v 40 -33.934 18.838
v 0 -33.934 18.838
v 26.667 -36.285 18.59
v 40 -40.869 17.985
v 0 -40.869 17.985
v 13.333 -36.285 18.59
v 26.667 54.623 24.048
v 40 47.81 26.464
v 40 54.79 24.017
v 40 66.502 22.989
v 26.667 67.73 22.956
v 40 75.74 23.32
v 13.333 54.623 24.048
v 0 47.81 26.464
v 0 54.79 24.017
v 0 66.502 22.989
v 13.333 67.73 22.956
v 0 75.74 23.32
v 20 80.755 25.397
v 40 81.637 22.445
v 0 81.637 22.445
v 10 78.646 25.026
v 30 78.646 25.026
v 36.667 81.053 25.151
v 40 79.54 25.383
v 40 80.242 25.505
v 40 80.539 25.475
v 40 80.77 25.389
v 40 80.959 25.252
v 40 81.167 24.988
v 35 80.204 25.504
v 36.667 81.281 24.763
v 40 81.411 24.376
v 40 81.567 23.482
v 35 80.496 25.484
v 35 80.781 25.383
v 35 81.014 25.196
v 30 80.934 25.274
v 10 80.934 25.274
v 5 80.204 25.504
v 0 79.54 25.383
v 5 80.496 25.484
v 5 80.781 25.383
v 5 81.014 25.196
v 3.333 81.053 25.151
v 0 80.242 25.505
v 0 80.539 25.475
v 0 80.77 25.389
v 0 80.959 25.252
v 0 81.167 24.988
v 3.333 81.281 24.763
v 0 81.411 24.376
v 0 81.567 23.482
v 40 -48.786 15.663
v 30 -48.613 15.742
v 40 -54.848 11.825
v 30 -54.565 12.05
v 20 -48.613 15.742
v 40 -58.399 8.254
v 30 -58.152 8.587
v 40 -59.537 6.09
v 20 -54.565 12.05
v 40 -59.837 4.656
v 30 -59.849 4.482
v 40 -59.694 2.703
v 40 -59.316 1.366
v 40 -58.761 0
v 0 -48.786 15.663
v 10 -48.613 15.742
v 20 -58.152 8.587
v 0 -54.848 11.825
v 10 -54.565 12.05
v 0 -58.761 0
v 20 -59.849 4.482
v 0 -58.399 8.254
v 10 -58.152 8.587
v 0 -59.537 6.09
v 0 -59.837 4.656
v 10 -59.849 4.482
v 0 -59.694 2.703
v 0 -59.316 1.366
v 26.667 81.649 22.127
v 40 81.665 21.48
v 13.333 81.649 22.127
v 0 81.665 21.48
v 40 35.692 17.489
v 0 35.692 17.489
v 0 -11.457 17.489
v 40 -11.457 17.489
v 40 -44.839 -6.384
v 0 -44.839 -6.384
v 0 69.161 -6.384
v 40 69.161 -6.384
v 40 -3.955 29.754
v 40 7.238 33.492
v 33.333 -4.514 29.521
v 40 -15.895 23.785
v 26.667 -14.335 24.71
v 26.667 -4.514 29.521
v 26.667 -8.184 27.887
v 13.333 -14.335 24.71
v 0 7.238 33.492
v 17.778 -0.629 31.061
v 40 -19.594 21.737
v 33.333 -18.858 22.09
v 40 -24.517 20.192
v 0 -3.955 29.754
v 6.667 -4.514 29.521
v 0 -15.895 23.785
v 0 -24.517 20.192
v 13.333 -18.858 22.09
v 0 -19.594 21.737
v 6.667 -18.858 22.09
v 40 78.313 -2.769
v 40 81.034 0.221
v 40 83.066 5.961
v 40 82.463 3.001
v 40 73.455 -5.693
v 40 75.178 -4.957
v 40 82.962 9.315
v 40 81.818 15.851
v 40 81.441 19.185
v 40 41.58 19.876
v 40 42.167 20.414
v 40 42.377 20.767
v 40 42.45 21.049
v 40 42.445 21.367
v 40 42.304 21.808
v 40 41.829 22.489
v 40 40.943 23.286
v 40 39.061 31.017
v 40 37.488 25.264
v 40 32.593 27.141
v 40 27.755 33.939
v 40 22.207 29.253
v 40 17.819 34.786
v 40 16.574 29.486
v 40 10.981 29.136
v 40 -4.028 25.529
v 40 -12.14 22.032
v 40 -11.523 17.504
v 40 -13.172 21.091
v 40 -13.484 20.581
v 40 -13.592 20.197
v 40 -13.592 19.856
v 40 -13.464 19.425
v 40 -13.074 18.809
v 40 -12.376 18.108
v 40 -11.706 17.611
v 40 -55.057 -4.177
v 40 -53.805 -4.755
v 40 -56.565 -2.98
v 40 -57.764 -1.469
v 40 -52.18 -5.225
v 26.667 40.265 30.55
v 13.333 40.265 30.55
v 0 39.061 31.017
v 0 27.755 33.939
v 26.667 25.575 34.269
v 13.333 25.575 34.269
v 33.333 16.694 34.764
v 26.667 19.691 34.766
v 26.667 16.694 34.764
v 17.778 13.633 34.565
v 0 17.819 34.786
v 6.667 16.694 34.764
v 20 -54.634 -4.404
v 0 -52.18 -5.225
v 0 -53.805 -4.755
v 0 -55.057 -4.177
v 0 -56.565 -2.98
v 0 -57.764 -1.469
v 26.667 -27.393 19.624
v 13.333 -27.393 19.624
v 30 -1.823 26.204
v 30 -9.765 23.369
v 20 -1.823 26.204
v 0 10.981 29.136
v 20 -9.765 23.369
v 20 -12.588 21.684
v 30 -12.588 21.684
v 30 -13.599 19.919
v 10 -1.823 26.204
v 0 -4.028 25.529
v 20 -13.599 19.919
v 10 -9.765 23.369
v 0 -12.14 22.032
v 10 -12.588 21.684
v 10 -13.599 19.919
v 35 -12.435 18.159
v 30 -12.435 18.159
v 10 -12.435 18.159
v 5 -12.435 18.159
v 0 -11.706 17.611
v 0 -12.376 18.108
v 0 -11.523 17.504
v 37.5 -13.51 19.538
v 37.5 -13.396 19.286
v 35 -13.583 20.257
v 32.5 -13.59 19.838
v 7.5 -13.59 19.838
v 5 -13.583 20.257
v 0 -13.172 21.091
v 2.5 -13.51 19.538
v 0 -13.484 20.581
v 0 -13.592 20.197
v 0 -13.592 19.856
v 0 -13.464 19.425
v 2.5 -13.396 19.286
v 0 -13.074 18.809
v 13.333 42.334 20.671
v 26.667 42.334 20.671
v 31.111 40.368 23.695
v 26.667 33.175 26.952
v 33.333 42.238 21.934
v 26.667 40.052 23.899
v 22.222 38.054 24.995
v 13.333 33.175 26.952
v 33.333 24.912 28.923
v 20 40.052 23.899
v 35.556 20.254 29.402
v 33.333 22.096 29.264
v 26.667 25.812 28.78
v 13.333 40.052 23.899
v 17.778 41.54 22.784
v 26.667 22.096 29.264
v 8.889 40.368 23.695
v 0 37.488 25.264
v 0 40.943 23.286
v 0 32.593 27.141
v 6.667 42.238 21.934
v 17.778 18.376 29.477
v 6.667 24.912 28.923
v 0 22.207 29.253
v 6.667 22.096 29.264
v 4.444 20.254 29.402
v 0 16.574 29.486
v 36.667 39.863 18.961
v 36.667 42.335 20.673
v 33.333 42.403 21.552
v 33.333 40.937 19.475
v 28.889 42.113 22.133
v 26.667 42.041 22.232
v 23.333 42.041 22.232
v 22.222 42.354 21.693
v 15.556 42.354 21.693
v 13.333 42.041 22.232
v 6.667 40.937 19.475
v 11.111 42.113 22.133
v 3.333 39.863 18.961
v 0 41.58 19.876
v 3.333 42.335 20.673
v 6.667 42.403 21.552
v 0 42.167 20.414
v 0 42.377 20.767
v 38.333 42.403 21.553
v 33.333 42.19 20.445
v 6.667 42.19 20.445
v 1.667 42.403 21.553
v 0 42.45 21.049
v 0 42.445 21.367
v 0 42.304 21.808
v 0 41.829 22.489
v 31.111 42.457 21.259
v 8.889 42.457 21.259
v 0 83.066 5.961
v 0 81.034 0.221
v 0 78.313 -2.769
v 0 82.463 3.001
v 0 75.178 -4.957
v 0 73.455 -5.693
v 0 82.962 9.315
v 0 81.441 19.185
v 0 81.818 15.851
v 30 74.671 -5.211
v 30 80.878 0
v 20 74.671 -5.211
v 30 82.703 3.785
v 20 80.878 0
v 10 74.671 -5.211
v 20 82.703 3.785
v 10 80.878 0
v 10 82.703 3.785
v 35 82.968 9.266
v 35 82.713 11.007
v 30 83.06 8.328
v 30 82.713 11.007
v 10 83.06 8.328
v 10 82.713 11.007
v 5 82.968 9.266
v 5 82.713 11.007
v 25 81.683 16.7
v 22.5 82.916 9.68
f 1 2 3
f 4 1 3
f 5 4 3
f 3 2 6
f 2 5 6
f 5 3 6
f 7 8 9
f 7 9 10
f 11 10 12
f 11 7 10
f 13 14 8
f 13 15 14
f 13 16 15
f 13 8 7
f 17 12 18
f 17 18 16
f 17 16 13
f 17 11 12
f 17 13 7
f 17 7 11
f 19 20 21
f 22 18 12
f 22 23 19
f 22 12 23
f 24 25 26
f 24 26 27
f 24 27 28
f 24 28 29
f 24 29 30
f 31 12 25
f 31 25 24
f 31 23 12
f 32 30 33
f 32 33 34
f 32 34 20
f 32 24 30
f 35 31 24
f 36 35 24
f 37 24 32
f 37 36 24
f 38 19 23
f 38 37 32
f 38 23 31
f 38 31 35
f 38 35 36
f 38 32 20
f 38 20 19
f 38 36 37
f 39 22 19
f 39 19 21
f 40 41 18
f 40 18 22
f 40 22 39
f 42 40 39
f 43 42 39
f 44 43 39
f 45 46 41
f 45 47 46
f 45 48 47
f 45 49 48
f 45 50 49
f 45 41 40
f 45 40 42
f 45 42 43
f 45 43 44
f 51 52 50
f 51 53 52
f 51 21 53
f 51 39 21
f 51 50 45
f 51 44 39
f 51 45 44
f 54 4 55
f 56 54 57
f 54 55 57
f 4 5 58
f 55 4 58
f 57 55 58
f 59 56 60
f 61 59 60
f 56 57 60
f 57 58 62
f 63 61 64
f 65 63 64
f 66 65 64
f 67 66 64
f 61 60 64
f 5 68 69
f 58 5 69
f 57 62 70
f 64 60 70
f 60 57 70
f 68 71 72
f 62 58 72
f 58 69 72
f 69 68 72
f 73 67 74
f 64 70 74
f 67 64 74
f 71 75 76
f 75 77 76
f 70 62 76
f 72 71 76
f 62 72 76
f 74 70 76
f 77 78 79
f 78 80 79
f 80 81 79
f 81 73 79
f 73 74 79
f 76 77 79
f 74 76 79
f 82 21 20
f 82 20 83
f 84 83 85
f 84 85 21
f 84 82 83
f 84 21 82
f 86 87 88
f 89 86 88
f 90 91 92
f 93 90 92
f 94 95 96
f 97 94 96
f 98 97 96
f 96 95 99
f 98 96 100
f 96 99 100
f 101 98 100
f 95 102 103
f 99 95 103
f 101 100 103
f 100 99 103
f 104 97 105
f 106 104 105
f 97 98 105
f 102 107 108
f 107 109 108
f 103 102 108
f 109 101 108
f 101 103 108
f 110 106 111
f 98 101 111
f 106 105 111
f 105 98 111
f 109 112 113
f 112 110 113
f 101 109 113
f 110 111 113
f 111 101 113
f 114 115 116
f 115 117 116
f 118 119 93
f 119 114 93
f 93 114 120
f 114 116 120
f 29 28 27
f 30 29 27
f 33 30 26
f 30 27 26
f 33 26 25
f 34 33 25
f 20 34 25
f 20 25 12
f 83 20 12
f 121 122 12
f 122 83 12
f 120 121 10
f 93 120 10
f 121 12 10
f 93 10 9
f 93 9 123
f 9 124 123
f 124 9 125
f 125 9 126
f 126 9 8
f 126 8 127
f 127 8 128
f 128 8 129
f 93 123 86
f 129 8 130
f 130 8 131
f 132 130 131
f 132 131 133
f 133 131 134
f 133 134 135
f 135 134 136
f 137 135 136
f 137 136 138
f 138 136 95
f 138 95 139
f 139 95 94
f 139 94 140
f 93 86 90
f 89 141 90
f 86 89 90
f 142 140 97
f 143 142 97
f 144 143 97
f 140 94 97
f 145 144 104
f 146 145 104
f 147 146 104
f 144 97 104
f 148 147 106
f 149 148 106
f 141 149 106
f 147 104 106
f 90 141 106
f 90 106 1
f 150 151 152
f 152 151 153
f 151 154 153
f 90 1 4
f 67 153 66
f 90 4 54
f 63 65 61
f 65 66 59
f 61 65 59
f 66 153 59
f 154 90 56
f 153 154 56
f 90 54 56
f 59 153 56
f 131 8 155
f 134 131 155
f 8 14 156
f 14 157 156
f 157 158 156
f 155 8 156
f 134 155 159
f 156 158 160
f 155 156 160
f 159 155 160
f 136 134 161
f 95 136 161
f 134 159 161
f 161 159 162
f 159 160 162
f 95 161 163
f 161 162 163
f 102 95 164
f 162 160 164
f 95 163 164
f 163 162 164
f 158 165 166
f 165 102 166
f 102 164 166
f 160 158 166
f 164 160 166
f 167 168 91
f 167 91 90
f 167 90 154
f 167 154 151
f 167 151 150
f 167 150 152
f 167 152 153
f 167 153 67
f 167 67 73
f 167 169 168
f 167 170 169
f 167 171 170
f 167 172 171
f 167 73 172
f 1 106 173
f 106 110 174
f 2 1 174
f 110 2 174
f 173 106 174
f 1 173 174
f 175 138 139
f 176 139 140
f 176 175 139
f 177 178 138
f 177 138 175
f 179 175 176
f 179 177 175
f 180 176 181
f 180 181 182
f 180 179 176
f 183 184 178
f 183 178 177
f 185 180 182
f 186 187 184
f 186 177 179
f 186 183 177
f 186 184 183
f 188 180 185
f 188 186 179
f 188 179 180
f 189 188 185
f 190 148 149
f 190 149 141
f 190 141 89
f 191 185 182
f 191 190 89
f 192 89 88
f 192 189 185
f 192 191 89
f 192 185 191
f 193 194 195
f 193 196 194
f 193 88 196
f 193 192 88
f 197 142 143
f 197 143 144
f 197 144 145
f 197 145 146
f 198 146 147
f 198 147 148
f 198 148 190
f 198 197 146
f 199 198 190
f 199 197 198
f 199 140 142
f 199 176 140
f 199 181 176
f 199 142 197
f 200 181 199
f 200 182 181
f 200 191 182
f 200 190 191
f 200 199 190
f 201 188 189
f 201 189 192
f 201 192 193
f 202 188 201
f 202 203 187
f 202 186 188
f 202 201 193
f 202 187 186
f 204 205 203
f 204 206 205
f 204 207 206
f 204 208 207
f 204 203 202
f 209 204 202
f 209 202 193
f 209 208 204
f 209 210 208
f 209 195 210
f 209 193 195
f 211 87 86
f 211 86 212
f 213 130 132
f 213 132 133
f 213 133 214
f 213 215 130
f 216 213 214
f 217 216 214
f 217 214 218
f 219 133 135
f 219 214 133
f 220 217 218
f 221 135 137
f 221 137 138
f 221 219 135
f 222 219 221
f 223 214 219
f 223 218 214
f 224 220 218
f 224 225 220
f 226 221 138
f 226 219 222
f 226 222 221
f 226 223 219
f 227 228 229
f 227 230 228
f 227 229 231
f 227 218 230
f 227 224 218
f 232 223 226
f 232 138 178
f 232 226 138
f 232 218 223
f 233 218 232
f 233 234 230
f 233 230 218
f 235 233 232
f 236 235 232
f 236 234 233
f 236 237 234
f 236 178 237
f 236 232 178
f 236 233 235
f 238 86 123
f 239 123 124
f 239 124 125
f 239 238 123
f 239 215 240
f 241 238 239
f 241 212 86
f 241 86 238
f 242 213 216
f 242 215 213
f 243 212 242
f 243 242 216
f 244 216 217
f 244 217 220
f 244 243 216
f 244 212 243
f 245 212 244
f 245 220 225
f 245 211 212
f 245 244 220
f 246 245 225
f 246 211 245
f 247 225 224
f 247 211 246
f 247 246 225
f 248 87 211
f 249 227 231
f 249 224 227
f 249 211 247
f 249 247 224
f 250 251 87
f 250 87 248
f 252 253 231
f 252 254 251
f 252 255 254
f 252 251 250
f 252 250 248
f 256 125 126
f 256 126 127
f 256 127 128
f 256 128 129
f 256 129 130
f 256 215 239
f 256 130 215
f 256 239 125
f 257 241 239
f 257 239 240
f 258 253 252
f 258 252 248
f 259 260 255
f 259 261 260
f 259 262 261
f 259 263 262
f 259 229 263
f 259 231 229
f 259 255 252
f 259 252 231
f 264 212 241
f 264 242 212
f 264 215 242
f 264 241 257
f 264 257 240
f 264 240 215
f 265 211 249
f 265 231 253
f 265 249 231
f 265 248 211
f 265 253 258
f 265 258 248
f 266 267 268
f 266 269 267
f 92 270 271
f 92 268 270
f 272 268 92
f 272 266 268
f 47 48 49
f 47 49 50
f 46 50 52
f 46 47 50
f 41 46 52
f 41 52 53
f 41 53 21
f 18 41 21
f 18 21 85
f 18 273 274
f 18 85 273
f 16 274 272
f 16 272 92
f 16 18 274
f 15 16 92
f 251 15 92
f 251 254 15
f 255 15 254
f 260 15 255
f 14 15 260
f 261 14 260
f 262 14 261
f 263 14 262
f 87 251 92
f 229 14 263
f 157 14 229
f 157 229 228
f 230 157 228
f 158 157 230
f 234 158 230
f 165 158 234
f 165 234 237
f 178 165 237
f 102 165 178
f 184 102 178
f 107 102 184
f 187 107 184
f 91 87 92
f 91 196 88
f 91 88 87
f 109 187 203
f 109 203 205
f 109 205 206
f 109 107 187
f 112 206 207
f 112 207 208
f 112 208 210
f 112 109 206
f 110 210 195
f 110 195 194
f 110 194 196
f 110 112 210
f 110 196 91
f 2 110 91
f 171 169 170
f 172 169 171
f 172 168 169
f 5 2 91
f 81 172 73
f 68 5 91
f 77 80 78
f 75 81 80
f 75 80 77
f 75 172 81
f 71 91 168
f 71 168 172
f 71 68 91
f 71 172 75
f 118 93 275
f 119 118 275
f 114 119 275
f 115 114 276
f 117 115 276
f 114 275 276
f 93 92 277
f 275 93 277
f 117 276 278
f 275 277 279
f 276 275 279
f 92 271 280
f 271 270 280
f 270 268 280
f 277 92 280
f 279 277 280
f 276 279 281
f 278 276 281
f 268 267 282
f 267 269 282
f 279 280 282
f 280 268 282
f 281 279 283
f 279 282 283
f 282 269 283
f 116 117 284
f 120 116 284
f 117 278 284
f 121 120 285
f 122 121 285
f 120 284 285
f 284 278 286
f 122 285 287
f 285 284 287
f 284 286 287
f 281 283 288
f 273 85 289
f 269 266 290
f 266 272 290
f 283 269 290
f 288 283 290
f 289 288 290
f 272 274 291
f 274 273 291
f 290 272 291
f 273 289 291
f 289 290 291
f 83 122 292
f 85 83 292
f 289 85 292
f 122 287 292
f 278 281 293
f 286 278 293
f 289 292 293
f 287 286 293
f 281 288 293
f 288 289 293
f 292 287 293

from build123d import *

# Parameters (mm, degrees)
F1_DEPTH = 40


with BuildPart() as f1:
    # F0 (on Right) → F1 (new body)
    with BuildSketch(Plane.YZ):
        with BuildLine():
            add(Edge.make_bspline(
                [(-44.838704501, -6.3841724768), (-46.8453205455, -5.825457283), (-55.6681341229, -5.7726866527), (-57.7306464731, -1.4179735635), (-58.7613759126, 0)],
                knots=[0, 0, 0, 0, 0.5626960778, 1, 1, 1, 1], degree=3))
            Line((-44.838704501, -6.3841724768), (69.161295499, -6.3841724768))
            add(Edge.make_bspline(
                [(69.161295499, -6.3841724768), (71.4475678954, -6.1729190484), (74.6946425338, -5.8699737813), (81.8275271025, -0.1960649024), (84.2715006558, 8.1620243826), (80.7845015237, 18.3321377417), (81.6652249495, 21.4803665876)],
                knots=[0, 0, 0, 0, 0.0810771817, 0.1783295809, 0.2792067504, 0.4028908662, 0.4028908662, 0.4028908662, 0.4028908662], degree=3))
            add(Edge.make_bspline(
                [(81.6374216797, 22.4453190982), (81.6500654198, 22.1293211952), (81.6576451847, 21.8048438914), (81.6652249495, 21.4803665876)],
                knots=[0.9139943138, 0.9139943138, 0.9139943138, 0.9139943138, 1, 1, 1, 1], degree=3))
            add(Edge.make_bspline(
                [(75.7401209274, 23.3199857175), (78.0850621891, 23.5805863979), (81.1237295684, 23.990384777), (81.6374216797, 22.4453190982)],
                knots=[0.7859721691, 0.7859721691, 0.7859721691, 0.7859721691, 0.9689675221, 0.9689675221, 0.9689675221, 0.9689675221], degree=3))
            add(Edge.make_bspline(
                [(47.8096007504, 26.4636462757), (50.4151132719, 25.2566612425), (54.0270677376, 23.6070629686), (68.3082992802, 22.7847875979), (72.6222400219, 22.9734858293), (75.7401209274, 23.3199857175)],
                knots=[0, 0, 0, 0, 0.2310309702, 0.5426578797, 0.7859721691, 0.7859721691, 0.7859721691, 0.7859721691], degree=3))
            add(Edge.make_bspline(
                [(47.8096007504, 26.4636462757), (38.9469496949, 27.2014516696), (19.8383470871, 30.9230949853), (7.2381034379, 33.4919049177)],
                knots=[0.7500808852, 0.7500808852, 0.7500808852, 0.7500808852, 0.9114828872, 0.9114828872, 0.9114828872, 0.9114828872], degree=3))
            add(Edge.make_bspline(
                [(7.2381034379, 33.4919049177), (7.0293313069, 33.4424692791), (-0.6619575082, 31.5703885813), (-15.3393975904, 24.8264789662), (-19.5332629376, 21.2280452336), (-24.5166032072, 20.1923100725)],
                knots=[0.4361701211, 0.4361701211, 0.4361701211, 0.4361701211, 0.4414328852, 0.6293645181, 0.7611494878, 0.7611494878, 0.7611494878, 0.7611494878], degree=3))
            add(Edge.make_bspline(
                [(-24.5166032072, 20.1923100725), (-27.1952683602, 19.5284516677), (-30.5343573496, 19.1890804899), (-33.9337619399, 18.8384775563)],
                knots=[0, 0, 0, 0, 0.1548207433, 0.1548207433, 0.1548207433, 0.1548207433], degree=3))
            add(Edge.make_bspline(
                [(-33.9337619399, 18.8384775563), (-36.1619029939, 18.5738236368), (-38.5117720873, 18.2998204972), (-40.8694513595, 17.9847684884)],
                knots=[0.82699703, 0.82699703, 0.82699703, 0.82699703, 0.867474623, 0.867474623, 0.867474623, 0.867474623], degree=3))
            add(Edge.make_bspline(
                [(-40.8694513595, 17.9847684884), (-41.7301591235, 17.843002501), (-47.4822650158, 16.7449192121), (-54.3846967183, 12.8459477913), (-60.8683867647, 6.2520742648), (-59.4702371494, 1.5500023351), (-58.7613759126, 0)],
                knots=[0.2618071145, 0.2618071145, 0.2618071145, 0.2618071145, 0.3034989867, 0.5490089029, 0.7603362688, 0.8611758874, 0.8611758874, 0.8611758874, 0.8611758874], degree=3))
        make_face()
        with BuildLine():
            add(Edge.make_bspline(
                [(10.9806247056, 29.136126861), (7.2108730674, 28.4910239279), (-0.4322852797, 26.9914683958), (-17.0990938919, 21.1353577397), (-11.5334123789, 17.4561242614), (-11.4637765201, 17.4852853631), (-11.4568779245, 17.4886267632)],
                knots=[0, 0, 0, 0, 0.3909237382, 0.7850289694, 0.9782824352, 1, 1, 1, 1], degree=3))
            add(Edge.make_bspline(
                [(35.6915146112, 17.4886267632), (36.7587346212, 17.9547515009), (47.3920951695, 20.4782306051), (31.2295468414, 28.9607742297), (18.3165498499, 29.9648338159), (10.9806247056, 29.136126861)],
                knots=[0, 0, 0, 0, 0.2520150835, 0.5614741686, 1, 1, 1, 1], degree=3))
            Line((35.6915146112, 17.4886267632), (21.6614138335, 17.4886267632))
            Line((21.6614138335, 17.4886267632), (-11.4568779245, 17.4886267632))
        make_face(mode=Mode.SUBTRACT)
        with BuildLine():
            add(Edge.make_bspline(
                [(-33.9337619399, 18.8384775563), (-36.2828655116, 18.5961990685), (-38.6607714567, 18.3485571057), (-40.8694513595, 17.9847684884)],
                knots=[0.1548207433, 0.1548207433, 0.1548207433, 0.1548207433, 0.2618071145, 0.2618071145, 0.2618071145, 0.2618071145], degree=3))
            add(Edge.make_bspline(
                [(-33.9337619399, 18.8384775563), (-36.1619029939, 18.5738236368), (-38.5117720873, 18.2998204972), (-40.8694513595, 17.9847684884)],
                knots=[0.82699703, 0.82699703, 0.82699703, 0.82699703, 0.867474623, 0.867474623, 0.867474623, 0.867474623], degree=3))
        make_face()
        with BuildLine():
            add(Edge.make_bspline(
                [(47.8096007504, 26.4636462757), (38.9469496949, 27.2014516696), (19.8383470871, 30.9230949853), (7.2381034379, 33.4919049177)],
                knots=[0.7500808852, 0.7500808852, 0.7500808852, 0.7500808852, 0.9114828872, 0.9114828872, 0.9114828872, 0.9114828872], degree=3))
            add(Edge.make_bspline(
                [(47.8096007504, 26.4636462757), (45.3407789538, 28.0318315658), (40.389939725, 31.0970656548), (25.1323891576, 35.0557908721), (13.8550573864, 35.0587488343), (7.2381034379, 33.4919049177)],
                knots=[0, 0, 0, 0, 0.1156638206, 0.269368798, 0.4361701211, 0.4361701211, 0.4361701211, 0.4361701211], degree=3))
        make_face()
        with BuildLine():
            add(Edge.make_bspline(
                [(75.7401209274, 23.3199857175), (78.0850621891, 23.5805863979), (81.1237295684, 23.990384777), (81.6374216797, 22.4453190982)],
                knots=[0.7859721691, 0.7859721691, 0.7859721691, 0.7859721691, 0.9689675221, 0.9689675221, 0.9689675221, 0.9689675221], degree=3))
            add(Edge.make_bspline(
                [(75.7401209274, 23.3199857175), (77.7663103657, 24.605784142), (81.2120858063, 26.792436855), (81.582065434, 23.8288066823), (81.6374216797, 22.4453190982)],
                knots=[0, 0, 0, 0, 0.5374481469, 0.9139943138, 0.9139943138, 0.9139943138, 0.9139943138], degree=3))
        make_face()
    extrude(amount=F1_DEPTH)


solid = f1.part
